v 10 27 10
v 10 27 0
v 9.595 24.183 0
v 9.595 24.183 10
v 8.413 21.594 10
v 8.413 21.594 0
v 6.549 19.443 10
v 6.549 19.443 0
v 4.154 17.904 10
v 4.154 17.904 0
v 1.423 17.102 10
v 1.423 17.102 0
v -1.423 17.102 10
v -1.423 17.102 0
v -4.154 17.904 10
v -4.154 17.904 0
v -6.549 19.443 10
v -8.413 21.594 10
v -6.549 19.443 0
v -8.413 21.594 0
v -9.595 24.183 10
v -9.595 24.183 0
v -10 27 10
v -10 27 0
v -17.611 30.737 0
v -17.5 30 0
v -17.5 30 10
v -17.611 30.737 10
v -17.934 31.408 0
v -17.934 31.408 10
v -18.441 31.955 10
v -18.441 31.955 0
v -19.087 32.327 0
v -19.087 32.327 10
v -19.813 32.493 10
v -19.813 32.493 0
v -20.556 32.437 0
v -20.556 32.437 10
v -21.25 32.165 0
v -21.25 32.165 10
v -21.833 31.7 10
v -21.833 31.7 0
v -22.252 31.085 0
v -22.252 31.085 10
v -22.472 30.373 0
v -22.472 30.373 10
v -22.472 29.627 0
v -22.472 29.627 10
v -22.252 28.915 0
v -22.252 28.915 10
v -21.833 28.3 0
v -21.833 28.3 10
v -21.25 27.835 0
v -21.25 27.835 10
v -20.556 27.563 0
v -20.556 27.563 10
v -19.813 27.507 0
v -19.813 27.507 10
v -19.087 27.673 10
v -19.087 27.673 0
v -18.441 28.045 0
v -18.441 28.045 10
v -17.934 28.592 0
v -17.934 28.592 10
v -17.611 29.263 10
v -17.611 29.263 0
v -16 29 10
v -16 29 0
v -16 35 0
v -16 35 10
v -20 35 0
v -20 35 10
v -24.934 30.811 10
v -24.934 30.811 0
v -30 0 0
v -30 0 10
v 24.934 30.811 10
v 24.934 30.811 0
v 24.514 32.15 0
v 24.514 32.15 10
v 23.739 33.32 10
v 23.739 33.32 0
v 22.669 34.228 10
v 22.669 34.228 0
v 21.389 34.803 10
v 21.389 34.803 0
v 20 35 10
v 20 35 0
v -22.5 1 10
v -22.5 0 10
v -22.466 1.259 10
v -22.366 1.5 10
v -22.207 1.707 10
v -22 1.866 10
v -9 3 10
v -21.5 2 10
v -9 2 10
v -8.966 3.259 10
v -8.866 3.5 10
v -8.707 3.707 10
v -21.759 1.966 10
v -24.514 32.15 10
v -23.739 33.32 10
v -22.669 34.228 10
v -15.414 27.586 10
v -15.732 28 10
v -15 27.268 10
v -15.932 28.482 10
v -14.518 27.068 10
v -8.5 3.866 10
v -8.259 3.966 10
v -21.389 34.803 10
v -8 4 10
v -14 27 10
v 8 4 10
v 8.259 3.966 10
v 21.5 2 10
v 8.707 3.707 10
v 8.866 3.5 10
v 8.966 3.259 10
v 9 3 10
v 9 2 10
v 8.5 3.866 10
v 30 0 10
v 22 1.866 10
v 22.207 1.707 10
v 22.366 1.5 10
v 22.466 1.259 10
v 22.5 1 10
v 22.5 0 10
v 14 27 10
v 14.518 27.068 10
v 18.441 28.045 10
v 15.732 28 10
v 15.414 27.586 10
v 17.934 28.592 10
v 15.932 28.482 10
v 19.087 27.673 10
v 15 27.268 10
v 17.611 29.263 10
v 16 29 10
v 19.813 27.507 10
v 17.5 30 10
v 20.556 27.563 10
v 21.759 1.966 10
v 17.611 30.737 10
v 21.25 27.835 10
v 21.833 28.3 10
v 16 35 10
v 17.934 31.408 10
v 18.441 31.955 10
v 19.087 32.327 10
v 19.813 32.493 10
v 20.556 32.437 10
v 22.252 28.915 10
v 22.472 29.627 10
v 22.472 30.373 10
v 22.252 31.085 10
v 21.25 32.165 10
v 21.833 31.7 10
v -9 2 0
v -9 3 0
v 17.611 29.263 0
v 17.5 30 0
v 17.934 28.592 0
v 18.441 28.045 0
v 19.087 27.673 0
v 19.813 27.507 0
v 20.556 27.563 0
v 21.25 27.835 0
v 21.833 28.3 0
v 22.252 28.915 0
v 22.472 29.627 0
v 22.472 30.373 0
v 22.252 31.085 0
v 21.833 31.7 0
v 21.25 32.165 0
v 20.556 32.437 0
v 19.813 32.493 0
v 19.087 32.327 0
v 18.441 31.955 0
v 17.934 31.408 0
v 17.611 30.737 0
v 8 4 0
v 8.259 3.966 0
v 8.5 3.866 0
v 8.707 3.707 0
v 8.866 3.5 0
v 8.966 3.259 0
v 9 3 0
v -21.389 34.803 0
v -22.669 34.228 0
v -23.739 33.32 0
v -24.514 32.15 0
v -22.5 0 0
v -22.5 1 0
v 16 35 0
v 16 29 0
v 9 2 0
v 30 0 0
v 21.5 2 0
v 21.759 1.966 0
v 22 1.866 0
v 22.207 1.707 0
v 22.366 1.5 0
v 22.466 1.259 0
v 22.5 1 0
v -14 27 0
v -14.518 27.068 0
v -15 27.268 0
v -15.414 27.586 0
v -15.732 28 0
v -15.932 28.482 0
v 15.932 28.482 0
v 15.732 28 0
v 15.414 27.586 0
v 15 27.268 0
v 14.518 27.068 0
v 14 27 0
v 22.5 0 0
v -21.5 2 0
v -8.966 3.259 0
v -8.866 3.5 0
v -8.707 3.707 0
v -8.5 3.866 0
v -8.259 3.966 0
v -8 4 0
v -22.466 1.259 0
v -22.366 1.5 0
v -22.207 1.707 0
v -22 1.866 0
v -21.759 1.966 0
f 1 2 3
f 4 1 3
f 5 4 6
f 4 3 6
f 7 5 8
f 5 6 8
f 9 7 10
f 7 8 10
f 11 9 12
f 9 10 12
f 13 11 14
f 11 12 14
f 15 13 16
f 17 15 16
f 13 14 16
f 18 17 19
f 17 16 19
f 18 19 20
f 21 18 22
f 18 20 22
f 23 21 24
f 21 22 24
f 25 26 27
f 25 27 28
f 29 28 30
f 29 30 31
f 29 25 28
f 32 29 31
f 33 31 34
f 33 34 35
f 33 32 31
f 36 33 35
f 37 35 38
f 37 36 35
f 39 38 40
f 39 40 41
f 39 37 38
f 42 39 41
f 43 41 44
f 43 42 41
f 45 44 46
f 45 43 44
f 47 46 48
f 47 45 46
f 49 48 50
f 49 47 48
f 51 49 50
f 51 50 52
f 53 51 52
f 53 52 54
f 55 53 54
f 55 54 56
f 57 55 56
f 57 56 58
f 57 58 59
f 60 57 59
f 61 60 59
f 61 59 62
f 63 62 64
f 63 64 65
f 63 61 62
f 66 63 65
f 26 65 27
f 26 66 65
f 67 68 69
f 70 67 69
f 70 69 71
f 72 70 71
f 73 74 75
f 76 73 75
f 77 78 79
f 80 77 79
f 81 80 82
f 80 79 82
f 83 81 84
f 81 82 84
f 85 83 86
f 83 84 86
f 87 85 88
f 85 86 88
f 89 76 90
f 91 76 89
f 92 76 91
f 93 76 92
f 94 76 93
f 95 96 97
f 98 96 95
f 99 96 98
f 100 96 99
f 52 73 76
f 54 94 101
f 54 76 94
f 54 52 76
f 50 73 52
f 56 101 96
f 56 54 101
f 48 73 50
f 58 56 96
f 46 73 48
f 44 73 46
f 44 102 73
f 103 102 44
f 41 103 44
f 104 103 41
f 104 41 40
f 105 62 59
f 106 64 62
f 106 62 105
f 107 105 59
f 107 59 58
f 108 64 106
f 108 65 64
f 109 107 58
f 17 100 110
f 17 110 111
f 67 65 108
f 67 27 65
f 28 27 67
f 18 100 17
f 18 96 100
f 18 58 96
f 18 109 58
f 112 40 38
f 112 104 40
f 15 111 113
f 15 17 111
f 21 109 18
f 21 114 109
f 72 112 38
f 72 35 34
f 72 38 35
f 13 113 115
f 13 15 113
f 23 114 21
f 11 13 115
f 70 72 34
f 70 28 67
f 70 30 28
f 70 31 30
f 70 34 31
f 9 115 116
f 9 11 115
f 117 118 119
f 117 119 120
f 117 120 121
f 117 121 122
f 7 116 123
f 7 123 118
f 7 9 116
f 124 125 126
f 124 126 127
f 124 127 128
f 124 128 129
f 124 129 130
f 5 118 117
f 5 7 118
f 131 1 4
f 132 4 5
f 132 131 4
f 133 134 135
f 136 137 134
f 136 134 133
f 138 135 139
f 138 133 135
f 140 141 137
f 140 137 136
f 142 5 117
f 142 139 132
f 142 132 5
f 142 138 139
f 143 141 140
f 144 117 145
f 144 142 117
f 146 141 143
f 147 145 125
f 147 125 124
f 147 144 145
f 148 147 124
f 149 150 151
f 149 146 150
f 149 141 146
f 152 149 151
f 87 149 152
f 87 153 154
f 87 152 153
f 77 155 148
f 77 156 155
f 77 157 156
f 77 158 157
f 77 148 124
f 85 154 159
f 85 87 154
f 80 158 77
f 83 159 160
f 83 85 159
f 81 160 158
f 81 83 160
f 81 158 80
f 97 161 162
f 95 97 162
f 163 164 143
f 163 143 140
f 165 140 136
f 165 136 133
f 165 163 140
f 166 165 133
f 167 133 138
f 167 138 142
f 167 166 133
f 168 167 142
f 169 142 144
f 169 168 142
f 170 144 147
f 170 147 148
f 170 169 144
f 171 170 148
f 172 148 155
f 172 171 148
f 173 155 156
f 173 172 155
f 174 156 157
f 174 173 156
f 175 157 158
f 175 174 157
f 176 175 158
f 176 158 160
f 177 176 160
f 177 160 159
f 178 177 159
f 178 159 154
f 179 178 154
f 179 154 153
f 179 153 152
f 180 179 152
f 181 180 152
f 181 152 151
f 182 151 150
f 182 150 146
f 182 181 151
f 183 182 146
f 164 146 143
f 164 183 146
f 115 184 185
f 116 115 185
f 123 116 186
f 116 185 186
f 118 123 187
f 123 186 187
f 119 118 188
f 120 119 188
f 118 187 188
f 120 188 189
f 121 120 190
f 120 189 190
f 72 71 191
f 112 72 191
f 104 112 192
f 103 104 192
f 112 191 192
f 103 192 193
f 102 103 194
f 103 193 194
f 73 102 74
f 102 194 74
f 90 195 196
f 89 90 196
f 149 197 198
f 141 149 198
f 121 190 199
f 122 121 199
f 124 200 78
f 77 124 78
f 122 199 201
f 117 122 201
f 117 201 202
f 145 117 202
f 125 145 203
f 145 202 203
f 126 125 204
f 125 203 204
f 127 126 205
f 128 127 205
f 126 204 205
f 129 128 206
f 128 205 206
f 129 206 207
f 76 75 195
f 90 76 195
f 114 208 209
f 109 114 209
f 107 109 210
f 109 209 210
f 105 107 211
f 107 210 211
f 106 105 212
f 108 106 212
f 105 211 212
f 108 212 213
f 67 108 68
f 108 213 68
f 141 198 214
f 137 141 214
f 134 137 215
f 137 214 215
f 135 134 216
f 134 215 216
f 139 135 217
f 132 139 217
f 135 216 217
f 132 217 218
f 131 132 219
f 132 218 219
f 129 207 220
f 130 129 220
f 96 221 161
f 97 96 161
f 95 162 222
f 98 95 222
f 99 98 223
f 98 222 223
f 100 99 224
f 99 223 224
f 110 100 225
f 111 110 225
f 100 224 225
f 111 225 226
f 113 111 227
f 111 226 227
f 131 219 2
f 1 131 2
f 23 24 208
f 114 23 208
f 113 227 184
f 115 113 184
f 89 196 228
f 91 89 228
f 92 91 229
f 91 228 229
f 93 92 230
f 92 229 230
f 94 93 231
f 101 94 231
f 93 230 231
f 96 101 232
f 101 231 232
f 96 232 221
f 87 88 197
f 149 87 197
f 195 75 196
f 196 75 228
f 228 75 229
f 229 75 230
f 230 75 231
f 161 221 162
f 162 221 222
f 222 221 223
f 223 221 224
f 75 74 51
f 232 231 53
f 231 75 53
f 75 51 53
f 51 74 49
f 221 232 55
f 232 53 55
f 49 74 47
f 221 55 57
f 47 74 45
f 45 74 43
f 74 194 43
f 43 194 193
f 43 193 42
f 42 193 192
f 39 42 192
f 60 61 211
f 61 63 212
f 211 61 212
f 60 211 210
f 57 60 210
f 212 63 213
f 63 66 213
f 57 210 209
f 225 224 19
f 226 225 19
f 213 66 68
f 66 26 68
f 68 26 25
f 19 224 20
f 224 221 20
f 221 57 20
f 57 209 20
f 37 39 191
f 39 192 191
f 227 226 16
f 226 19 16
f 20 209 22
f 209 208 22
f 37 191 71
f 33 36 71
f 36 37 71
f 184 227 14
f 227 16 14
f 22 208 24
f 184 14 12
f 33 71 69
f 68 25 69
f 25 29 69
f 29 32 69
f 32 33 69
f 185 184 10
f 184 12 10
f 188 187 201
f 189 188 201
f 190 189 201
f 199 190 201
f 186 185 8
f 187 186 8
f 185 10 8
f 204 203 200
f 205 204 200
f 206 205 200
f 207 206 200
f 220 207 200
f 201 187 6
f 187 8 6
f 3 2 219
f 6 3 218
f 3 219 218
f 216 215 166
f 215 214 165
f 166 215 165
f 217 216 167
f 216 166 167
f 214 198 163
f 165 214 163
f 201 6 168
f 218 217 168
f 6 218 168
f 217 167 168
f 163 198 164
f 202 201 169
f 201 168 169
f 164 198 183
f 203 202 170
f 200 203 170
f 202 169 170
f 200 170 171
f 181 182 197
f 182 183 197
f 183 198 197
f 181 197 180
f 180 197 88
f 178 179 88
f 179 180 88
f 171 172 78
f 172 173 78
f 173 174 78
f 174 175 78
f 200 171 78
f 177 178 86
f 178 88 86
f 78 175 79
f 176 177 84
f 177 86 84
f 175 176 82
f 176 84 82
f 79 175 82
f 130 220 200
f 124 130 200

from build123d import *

# Parameters (mm, degrees)
SKETCH1_R           = 2.5
BOSS_EXTRUDE1_DEPTH = 10


with BuildPart() as part:
    # Sketch1 → Boss-Extrude1 (new body)
    with BuildSketch(Plane.XY):
        with BuildLine():
            Line((-30, 0), (-22.5, 0))
            Line((-22.5, 0), (-22.5, 1))
            ThreePointArc((-22.5, 1), (-22.207106781, 1.707106781), (-21.5, 2))
            Line((-21.5, 2), (-9, 2))
            Line((-9, 2), (-9, 3))
            ThreePointArc((-9, 3), (-8.707106781, 3.707106781), (-8, 4))
            Line((-8, 4), (8, 4))
            ThreePointArc((8, 4), (8.707106781, 3.707106781), (9, 3))
            Line((9, 3), (9, 2))
            Line((9, 2), (21.5, 2))
            ThreePointArc((21.5, 2), (22.207106781, 1.707106781), (22.5, 1))
            Line((22.5, 1), (22.5, 0))
            Line((22.5, 0), (30, 0))
            Line((30, 0), (24.933748499, 30.8112495))
            ThreePointArc((24.933748499, 30.8112495), (23.236027851, 33.811577593), (20, 35))
            Line((20, 35), (16, 35))
            Line((16, 35), (16, 29))
            ThreePointArc((16, 29), (15.414213562, 27.585786438), (14, 27))
            Line((14, 27), (10, 27))
            ThreePointArc((10, 27), (0, 17), (-10, 27))
            Line((-10, 27), (-14, 27))
            ThreePointArc((-14, 27), (-15.414213562, 27.585786438), (-16, 29))
            Line((-16, 29), (-16, 35))
            Line((-16, 35), (-20, 35))
            ThreePointArc((-20, 35), (-23.236027851, 33.811577593), (-24.933748499, 30.8112495))
            Line((-24.933748499, 30.8112495), (-30, 0))
        make_face()
        with Locations((-20, 30)):
            Circle(SKETCH1_R, mode=Mode.SUBTRACT)
        with Locations(Location((20, 30, 0), (0, 0, 180))):
            Circle(SKETCH1_R, mode=Mode.SUBTRACT)
    extrude(amount=BOSS_EXTRUDE1_DEPTH)


solid = part.part
